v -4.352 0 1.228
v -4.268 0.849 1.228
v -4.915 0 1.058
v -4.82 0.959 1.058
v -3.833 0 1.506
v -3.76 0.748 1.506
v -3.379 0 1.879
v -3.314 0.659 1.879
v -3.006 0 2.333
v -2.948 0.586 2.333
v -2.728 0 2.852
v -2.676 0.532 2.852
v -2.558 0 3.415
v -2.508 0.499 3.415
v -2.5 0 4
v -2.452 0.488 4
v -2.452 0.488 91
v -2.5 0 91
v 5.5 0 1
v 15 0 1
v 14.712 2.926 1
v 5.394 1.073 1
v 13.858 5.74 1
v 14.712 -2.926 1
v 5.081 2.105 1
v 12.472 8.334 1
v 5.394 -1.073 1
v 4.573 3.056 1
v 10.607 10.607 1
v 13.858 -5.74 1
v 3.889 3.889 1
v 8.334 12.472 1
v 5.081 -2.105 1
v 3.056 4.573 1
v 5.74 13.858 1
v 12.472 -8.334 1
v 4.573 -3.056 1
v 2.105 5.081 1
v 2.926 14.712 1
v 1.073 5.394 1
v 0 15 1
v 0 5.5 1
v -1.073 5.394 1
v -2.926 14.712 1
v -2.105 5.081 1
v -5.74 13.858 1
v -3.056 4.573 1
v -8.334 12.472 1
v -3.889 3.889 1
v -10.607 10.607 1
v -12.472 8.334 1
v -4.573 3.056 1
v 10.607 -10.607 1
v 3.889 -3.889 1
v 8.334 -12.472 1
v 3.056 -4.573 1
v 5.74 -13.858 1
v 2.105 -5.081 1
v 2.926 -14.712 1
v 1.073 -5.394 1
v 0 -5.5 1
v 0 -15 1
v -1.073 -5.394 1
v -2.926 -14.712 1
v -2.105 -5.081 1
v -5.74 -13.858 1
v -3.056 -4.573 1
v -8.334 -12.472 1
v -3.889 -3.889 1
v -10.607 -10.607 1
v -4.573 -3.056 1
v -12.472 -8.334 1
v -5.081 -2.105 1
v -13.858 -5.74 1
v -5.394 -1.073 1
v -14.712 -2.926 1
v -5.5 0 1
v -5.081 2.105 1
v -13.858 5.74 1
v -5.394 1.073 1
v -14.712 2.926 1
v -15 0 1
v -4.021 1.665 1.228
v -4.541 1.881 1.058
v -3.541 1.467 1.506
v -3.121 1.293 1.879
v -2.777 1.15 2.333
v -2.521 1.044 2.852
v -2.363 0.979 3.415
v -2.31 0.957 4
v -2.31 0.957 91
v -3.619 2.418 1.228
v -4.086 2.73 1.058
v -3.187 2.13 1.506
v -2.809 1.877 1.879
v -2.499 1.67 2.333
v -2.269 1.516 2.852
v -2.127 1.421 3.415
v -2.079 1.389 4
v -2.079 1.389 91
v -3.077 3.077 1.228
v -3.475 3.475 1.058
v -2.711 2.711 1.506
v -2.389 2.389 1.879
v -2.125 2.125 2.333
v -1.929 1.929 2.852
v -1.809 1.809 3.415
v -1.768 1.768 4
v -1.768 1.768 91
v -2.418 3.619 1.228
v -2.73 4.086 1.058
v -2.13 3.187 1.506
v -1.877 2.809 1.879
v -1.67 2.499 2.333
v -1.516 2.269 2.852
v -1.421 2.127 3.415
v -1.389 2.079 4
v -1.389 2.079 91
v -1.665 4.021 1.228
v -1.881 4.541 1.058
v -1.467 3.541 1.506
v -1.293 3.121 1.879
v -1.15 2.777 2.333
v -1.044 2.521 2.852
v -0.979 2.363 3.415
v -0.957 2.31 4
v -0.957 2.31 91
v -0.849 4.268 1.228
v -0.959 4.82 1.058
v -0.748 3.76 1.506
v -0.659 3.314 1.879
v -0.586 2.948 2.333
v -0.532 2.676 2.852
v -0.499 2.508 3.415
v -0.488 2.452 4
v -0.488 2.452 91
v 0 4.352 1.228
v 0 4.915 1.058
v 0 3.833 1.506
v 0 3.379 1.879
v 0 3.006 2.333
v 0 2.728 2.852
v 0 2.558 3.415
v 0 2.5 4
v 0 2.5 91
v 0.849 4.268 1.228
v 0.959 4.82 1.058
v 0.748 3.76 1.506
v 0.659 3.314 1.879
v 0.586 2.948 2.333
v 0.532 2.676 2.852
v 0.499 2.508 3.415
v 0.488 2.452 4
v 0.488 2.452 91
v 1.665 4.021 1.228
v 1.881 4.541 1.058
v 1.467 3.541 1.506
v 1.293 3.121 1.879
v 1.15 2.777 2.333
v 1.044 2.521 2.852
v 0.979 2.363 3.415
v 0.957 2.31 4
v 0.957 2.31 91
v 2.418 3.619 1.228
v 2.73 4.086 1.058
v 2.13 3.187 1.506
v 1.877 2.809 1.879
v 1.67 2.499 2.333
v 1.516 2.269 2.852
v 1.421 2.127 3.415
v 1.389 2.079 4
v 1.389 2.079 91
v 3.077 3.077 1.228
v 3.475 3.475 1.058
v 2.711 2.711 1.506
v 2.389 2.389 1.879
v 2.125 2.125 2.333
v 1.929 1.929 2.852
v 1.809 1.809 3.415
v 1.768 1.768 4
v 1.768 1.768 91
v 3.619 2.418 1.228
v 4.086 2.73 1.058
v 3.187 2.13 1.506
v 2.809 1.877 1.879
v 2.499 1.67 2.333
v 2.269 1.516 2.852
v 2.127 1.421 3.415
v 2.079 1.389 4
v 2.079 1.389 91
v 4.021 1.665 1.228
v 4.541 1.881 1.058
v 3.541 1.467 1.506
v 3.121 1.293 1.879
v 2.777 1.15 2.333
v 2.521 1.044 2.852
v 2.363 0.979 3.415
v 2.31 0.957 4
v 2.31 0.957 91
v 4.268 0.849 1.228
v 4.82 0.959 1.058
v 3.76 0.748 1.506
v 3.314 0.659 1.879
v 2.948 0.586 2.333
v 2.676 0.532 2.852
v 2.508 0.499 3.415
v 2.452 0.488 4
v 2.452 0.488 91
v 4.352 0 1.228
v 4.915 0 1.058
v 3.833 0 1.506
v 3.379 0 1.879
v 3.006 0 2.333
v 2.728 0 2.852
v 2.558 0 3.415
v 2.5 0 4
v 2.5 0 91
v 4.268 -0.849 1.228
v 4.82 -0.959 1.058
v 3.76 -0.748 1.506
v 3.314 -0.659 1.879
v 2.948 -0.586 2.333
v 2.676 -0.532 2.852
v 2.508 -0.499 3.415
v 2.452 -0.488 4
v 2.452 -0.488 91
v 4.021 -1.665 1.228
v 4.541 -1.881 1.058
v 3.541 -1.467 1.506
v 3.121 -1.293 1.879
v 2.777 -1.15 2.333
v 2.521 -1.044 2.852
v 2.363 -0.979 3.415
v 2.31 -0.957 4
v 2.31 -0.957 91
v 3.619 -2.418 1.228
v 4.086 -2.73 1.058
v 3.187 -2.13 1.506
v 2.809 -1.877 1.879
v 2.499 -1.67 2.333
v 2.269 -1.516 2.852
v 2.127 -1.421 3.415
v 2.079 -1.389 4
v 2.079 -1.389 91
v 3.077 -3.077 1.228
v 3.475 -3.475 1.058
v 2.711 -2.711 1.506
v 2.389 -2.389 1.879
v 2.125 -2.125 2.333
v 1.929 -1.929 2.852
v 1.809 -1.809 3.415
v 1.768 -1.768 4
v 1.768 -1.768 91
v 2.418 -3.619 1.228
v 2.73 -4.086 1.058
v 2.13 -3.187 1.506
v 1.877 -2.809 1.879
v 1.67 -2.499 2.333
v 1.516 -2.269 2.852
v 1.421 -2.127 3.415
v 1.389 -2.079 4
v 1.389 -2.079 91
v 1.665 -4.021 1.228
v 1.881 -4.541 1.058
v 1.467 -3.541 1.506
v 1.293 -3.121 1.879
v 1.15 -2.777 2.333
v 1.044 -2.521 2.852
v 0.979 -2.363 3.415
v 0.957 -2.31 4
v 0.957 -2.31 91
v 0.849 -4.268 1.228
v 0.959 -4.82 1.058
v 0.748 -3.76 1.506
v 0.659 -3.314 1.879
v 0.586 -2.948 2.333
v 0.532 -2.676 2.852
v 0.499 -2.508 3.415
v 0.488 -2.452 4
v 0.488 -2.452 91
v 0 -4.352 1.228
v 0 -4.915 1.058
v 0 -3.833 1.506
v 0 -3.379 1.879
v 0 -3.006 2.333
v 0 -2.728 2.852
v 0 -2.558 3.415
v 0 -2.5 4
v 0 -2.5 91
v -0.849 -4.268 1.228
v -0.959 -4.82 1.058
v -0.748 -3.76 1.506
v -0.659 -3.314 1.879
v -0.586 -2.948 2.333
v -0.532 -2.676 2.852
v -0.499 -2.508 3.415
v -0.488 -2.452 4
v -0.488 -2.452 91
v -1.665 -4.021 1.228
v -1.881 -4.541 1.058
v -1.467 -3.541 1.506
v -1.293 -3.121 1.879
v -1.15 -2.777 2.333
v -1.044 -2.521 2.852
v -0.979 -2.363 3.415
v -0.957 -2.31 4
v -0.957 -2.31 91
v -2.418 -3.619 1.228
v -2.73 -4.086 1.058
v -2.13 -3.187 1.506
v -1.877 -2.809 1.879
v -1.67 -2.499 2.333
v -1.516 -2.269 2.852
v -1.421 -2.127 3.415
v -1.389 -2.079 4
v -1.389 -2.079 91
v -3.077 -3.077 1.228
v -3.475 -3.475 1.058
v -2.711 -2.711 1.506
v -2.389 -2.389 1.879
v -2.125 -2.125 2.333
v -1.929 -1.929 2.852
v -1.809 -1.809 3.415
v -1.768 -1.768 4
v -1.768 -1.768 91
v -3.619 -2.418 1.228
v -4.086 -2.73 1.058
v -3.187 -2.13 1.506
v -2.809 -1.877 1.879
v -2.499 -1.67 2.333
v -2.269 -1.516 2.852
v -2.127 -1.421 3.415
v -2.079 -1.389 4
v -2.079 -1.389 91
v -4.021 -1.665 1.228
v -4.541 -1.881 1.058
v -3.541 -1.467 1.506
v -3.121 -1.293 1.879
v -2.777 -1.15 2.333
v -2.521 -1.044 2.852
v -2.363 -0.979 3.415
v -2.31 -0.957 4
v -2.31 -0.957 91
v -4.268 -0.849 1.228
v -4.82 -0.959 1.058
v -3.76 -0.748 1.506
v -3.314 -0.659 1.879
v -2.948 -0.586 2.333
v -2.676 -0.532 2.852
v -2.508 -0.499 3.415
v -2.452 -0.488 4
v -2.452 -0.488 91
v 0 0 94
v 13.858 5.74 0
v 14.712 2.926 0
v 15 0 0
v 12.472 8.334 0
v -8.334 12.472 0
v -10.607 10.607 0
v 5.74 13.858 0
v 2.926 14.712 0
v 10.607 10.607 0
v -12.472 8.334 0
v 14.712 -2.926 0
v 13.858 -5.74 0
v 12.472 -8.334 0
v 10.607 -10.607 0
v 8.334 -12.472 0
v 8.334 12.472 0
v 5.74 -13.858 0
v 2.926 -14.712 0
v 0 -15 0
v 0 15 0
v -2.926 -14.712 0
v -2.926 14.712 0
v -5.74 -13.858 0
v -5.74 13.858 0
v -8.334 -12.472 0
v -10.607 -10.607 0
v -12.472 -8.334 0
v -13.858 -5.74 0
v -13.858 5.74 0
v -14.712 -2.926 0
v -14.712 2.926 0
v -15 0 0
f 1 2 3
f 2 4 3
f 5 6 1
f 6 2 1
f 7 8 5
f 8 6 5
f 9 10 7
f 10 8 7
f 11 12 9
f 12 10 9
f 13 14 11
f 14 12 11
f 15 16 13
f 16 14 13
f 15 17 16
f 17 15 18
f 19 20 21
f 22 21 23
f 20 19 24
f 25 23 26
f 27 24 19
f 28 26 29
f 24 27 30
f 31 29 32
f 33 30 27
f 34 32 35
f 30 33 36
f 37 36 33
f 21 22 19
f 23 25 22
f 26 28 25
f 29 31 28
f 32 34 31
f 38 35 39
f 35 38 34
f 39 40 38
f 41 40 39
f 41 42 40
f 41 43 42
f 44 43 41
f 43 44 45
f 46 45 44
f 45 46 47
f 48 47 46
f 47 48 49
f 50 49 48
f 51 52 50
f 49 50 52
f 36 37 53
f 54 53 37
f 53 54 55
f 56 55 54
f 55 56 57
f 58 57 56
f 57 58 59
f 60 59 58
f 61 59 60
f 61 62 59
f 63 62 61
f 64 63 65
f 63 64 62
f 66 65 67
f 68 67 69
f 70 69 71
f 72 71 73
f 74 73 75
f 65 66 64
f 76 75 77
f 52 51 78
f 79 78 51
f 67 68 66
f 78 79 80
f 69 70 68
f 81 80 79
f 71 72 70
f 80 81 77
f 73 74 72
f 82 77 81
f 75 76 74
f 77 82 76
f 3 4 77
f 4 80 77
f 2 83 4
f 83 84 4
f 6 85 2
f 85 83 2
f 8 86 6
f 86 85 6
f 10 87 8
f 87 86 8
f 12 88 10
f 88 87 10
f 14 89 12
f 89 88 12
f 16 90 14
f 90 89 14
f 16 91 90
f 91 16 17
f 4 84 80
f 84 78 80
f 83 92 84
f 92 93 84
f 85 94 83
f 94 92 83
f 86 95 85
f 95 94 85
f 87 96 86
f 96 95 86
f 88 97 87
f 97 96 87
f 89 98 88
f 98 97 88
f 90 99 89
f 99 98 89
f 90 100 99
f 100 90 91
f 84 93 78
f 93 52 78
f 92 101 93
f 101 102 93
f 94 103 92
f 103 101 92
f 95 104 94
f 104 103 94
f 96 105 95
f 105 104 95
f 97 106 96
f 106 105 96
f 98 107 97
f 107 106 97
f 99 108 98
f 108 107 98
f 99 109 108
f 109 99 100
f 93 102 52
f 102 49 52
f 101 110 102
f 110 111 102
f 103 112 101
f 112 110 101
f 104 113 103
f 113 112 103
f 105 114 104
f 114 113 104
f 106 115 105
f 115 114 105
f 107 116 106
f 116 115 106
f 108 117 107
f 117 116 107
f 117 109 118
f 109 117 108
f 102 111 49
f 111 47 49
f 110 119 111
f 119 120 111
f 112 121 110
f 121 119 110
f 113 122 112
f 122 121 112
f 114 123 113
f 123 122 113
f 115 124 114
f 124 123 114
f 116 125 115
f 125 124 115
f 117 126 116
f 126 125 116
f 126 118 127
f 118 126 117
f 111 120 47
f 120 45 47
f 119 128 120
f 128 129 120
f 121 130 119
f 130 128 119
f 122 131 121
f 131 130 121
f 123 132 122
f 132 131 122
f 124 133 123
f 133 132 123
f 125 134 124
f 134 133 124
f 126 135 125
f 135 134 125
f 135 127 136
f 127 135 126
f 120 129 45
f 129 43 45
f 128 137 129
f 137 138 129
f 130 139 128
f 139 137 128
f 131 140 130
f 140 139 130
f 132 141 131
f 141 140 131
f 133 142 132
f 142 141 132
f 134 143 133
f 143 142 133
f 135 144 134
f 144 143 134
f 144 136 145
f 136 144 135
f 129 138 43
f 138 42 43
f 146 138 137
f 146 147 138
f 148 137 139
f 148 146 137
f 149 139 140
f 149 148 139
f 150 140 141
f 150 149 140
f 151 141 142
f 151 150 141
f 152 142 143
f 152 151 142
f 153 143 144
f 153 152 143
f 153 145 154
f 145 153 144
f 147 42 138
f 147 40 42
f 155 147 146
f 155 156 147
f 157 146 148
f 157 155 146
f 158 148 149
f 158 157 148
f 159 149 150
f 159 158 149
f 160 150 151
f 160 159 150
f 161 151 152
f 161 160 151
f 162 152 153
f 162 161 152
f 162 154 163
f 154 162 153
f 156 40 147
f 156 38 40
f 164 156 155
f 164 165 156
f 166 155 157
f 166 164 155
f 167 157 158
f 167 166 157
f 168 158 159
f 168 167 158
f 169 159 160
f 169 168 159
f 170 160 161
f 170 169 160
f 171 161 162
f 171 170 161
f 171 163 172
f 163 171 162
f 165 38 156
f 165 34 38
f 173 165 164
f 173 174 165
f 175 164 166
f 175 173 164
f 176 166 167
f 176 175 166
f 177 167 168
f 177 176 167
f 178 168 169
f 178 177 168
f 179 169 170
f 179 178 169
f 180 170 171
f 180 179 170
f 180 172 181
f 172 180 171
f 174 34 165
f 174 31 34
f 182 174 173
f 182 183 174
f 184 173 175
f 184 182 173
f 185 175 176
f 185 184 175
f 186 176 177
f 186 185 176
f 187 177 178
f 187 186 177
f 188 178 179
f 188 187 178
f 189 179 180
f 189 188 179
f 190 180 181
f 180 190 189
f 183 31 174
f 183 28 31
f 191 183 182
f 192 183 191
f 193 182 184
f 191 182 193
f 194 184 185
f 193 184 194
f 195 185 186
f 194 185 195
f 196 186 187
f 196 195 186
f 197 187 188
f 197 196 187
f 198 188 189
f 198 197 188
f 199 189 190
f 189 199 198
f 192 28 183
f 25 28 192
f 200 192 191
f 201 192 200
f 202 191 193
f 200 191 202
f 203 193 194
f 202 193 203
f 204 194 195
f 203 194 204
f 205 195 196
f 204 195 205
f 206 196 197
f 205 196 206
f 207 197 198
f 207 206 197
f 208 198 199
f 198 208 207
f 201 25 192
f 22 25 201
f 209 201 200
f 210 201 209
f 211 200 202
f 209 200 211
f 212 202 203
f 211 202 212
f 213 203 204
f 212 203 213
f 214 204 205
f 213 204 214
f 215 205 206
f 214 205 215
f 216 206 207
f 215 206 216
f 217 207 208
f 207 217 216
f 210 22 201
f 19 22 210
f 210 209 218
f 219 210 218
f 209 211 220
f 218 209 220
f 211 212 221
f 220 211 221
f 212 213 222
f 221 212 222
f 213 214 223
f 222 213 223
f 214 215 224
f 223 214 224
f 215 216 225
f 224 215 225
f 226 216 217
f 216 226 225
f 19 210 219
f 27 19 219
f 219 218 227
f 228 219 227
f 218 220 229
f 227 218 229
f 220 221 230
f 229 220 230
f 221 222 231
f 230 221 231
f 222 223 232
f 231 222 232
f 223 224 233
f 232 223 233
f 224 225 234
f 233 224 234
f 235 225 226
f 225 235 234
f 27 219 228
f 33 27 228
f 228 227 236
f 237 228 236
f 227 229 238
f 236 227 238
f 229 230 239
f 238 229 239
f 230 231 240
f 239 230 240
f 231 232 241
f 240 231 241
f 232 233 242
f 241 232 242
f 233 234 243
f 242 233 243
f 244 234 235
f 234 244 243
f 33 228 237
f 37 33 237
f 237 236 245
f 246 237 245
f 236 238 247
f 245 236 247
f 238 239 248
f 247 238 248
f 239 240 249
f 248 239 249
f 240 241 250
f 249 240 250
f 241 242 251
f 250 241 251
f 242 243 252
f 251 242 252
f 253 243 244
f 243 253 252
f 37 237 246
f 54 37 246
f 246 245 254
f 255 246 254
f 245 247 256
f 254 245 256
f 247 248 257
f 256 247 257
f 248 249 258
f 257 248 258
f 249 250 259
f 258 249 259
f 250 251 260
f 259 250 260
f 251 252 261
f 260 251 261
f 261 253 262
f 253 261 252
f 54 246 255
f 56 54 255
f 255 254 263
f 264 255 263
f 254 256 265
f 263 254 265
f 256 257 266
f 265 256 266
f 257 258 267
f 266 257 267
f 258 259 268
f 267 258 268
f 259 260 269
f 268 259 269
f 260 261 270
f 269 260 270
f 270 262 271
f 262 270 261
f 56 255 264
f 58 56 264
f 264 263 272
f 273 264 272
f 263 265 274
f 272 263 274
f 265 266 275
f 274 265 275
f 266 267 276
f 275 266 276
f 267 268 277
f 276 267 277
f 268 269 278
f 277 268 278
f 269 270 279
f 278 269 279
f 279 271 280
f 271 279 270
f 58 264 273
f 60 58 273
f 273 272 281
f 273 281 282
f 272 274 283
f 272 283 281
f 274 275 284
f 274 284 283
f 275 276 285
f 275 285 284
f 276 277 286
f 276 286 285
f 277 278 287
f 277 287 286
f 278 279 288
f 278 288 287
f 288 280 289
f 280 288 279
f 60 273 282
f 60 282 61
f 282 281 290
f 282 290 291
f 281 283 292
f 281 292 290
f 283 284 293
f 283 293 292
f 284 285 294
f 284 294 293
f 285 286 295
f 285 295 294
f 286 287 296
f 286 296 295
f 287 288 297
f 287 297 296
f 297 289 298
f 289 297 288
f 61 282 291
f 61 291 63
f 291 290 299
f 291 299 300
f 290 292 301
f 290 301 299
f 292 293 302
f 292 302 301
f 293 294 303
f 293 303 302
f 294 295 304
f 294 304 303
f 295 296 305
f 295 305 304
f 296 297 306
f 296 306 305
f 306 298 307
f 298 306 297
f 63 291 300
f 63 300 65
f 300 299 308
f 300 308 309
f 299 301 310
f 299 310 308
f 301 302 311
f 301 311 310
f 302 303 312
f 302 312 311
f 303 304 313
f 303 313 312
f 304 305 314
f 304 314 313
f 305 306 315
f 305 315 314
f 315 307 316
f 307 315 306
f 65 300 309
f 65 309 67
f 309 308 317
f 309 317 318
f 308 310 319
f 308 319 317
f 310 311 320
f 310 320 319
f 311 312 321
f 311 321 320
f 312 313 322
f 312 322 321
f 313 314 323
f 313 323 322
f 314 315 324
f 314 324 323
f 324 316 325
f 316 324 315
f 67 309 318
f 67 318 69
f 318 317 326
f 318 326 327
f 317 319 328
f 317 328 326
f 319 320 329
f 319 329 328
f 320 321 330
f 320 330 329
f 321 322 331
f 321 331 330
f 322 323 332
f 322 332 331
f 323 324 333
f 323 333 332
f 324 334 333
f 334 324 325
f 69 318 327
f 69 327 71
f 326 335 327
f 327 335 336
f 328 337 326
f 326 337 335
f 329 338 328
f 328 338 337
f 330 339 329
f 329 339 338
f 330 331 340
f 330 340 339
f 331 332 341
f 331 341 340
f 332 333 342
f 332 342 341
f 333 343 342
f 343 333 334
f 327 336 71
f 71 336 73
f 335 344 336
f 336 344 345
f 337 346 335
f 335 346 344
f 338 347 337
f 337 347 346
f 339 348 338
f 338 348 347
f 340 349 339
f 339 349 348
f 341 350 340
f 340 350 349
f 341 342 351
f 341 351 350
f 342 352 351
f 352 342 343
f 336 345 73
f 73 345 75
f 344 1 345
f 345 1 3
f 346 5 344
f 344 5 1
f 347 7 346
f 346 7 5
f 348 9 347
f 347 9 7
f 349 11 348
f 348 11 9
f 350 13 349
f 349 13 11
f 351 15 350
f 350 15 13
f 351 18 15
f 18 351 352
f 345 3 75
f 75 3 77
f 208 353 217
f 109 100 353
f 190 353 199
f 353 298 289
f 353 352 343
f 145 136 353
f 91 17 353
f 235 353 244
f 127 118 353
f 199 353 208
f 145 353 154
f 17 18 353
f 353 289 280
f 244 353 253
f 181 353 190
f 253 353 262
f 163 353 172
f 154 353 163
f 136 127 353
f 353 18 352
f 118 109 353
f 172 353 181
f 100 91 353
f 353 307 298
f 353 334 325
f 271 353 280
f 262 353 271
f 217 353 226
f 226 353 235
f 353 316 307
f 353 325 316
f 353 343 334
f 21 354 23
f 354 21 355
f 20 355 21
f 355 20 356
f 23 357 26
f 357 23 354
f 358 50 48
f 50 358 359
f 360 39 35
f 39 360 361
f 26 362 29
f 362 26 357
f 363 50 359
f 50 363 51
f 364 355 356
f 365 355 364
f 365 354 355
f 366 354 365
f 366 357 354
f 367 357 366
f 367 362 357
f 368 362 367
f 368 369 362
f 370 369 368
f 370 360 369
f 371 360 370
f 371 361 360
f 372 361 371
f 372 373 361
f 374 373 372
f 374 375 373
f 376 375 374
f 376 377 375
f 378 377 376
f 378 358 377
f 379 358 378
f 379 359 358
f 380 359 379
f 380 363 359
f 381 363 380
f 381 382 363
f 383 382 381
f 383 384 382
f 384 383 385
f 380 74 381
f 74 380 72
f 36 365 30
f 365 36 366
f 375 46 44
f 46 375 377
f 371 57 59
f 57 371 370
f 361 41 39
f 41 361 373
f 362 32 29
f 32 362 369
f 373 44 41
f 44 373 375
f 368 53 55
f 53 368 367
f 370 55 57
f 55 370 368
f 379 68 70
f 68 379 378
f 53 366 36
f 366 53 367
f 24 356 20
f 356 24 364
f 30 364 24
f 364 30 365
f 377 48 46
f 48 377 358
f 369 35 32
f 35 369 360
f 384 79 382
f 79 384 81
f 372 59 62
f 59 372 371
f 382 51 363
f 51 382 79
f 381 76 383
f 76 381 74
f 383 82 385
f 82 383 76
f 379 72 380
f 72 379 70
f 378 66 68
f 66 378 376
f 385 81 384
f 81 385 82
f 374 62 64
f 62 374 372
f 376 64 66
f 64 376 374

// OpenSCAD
/*
Parametric Sewing Machine Thread Holder Attachment

Copyright 2024 nomike[AT]nomike[DOT]com

Redistribution and use in source and binary forms, with or without
modification, are permitted provided that the following conditions are met:

1. Redistributions of source code must retain the above copyright notice, this
list of conditions and the following disclaimer.

2. Redistributions in binary form must reproduce the above copyright notice,
this list of conditions and the following disclaimer in the documentation
and/or other materials provided with the distribution.

THIS SOFTWARE IS PROVIDED BY THE COPYRIGHT HOLDERS AND CONTRIBUTORS “AS IS” AND
ANY EXPRESS OR IMPLIED WARRANTIES, INCLUDING, BUT NOT LIMITED TO, THE IMPLIED
WARRANTIES OF MERCHANTABILITY AND FITNESS FOR A PARTICULAR PURPOSE ARE
DISCLAIMED. IN NO EVENT SHALL THE COPYRIGHT HOLDER OR CONTRIBUTORS BE LIABLE FOR
ANY DIRECT, INDIRECT, INCIDENTAL, SPECIAL, EXEMPLARY, OR CONSEQUENTIAL DAMAGES
(INCLUDING, BUT NOT LIMITED TO, PROCUREMENT OF SUBSTITUTE GOODS OR SERVICES;
LOSS OF USE, DATA, OR PROFITS; OR BUSINESS INTERRUPTION) HOWEVER CAUSED AND ON
ANY THEORY OF LIABILITY, WHETHER IN CONTRACT, STRICT LIABILITY, OR TORT
(INCLUDING NEGLIGENCE OR OTHERWISE) ARISING IN ANY WAY OUT OF THE USE OF THIS
SOFTWARE, EVEN IF ADVISED OF THE POSSIBILITY OF SUCH DAMAGE.
*/

$fn=32;
stem_radius = 2.5;
stem_height = 90;
base_radius = 30;
base_height = 1;
fillet_radius = 3;
slope_cylinder_height = 3;

translate([0, 0, base_height]) union() {
    rotate_extrude() translate([stem_radius, 0, 0]) difference() {
        square([fillet_radius, fillet_radius]);
        translate([fillet_radius, fillet_radius]) circle(3);
    }
    cylinder(r=stem_radius, h=stem_height);
    translate([0, 0, stem_height]) cylinder(r1=stem_radius, r2=0, h=slope_cylinder_height);
}

cylinder(d=base_radius, h=base_height);
